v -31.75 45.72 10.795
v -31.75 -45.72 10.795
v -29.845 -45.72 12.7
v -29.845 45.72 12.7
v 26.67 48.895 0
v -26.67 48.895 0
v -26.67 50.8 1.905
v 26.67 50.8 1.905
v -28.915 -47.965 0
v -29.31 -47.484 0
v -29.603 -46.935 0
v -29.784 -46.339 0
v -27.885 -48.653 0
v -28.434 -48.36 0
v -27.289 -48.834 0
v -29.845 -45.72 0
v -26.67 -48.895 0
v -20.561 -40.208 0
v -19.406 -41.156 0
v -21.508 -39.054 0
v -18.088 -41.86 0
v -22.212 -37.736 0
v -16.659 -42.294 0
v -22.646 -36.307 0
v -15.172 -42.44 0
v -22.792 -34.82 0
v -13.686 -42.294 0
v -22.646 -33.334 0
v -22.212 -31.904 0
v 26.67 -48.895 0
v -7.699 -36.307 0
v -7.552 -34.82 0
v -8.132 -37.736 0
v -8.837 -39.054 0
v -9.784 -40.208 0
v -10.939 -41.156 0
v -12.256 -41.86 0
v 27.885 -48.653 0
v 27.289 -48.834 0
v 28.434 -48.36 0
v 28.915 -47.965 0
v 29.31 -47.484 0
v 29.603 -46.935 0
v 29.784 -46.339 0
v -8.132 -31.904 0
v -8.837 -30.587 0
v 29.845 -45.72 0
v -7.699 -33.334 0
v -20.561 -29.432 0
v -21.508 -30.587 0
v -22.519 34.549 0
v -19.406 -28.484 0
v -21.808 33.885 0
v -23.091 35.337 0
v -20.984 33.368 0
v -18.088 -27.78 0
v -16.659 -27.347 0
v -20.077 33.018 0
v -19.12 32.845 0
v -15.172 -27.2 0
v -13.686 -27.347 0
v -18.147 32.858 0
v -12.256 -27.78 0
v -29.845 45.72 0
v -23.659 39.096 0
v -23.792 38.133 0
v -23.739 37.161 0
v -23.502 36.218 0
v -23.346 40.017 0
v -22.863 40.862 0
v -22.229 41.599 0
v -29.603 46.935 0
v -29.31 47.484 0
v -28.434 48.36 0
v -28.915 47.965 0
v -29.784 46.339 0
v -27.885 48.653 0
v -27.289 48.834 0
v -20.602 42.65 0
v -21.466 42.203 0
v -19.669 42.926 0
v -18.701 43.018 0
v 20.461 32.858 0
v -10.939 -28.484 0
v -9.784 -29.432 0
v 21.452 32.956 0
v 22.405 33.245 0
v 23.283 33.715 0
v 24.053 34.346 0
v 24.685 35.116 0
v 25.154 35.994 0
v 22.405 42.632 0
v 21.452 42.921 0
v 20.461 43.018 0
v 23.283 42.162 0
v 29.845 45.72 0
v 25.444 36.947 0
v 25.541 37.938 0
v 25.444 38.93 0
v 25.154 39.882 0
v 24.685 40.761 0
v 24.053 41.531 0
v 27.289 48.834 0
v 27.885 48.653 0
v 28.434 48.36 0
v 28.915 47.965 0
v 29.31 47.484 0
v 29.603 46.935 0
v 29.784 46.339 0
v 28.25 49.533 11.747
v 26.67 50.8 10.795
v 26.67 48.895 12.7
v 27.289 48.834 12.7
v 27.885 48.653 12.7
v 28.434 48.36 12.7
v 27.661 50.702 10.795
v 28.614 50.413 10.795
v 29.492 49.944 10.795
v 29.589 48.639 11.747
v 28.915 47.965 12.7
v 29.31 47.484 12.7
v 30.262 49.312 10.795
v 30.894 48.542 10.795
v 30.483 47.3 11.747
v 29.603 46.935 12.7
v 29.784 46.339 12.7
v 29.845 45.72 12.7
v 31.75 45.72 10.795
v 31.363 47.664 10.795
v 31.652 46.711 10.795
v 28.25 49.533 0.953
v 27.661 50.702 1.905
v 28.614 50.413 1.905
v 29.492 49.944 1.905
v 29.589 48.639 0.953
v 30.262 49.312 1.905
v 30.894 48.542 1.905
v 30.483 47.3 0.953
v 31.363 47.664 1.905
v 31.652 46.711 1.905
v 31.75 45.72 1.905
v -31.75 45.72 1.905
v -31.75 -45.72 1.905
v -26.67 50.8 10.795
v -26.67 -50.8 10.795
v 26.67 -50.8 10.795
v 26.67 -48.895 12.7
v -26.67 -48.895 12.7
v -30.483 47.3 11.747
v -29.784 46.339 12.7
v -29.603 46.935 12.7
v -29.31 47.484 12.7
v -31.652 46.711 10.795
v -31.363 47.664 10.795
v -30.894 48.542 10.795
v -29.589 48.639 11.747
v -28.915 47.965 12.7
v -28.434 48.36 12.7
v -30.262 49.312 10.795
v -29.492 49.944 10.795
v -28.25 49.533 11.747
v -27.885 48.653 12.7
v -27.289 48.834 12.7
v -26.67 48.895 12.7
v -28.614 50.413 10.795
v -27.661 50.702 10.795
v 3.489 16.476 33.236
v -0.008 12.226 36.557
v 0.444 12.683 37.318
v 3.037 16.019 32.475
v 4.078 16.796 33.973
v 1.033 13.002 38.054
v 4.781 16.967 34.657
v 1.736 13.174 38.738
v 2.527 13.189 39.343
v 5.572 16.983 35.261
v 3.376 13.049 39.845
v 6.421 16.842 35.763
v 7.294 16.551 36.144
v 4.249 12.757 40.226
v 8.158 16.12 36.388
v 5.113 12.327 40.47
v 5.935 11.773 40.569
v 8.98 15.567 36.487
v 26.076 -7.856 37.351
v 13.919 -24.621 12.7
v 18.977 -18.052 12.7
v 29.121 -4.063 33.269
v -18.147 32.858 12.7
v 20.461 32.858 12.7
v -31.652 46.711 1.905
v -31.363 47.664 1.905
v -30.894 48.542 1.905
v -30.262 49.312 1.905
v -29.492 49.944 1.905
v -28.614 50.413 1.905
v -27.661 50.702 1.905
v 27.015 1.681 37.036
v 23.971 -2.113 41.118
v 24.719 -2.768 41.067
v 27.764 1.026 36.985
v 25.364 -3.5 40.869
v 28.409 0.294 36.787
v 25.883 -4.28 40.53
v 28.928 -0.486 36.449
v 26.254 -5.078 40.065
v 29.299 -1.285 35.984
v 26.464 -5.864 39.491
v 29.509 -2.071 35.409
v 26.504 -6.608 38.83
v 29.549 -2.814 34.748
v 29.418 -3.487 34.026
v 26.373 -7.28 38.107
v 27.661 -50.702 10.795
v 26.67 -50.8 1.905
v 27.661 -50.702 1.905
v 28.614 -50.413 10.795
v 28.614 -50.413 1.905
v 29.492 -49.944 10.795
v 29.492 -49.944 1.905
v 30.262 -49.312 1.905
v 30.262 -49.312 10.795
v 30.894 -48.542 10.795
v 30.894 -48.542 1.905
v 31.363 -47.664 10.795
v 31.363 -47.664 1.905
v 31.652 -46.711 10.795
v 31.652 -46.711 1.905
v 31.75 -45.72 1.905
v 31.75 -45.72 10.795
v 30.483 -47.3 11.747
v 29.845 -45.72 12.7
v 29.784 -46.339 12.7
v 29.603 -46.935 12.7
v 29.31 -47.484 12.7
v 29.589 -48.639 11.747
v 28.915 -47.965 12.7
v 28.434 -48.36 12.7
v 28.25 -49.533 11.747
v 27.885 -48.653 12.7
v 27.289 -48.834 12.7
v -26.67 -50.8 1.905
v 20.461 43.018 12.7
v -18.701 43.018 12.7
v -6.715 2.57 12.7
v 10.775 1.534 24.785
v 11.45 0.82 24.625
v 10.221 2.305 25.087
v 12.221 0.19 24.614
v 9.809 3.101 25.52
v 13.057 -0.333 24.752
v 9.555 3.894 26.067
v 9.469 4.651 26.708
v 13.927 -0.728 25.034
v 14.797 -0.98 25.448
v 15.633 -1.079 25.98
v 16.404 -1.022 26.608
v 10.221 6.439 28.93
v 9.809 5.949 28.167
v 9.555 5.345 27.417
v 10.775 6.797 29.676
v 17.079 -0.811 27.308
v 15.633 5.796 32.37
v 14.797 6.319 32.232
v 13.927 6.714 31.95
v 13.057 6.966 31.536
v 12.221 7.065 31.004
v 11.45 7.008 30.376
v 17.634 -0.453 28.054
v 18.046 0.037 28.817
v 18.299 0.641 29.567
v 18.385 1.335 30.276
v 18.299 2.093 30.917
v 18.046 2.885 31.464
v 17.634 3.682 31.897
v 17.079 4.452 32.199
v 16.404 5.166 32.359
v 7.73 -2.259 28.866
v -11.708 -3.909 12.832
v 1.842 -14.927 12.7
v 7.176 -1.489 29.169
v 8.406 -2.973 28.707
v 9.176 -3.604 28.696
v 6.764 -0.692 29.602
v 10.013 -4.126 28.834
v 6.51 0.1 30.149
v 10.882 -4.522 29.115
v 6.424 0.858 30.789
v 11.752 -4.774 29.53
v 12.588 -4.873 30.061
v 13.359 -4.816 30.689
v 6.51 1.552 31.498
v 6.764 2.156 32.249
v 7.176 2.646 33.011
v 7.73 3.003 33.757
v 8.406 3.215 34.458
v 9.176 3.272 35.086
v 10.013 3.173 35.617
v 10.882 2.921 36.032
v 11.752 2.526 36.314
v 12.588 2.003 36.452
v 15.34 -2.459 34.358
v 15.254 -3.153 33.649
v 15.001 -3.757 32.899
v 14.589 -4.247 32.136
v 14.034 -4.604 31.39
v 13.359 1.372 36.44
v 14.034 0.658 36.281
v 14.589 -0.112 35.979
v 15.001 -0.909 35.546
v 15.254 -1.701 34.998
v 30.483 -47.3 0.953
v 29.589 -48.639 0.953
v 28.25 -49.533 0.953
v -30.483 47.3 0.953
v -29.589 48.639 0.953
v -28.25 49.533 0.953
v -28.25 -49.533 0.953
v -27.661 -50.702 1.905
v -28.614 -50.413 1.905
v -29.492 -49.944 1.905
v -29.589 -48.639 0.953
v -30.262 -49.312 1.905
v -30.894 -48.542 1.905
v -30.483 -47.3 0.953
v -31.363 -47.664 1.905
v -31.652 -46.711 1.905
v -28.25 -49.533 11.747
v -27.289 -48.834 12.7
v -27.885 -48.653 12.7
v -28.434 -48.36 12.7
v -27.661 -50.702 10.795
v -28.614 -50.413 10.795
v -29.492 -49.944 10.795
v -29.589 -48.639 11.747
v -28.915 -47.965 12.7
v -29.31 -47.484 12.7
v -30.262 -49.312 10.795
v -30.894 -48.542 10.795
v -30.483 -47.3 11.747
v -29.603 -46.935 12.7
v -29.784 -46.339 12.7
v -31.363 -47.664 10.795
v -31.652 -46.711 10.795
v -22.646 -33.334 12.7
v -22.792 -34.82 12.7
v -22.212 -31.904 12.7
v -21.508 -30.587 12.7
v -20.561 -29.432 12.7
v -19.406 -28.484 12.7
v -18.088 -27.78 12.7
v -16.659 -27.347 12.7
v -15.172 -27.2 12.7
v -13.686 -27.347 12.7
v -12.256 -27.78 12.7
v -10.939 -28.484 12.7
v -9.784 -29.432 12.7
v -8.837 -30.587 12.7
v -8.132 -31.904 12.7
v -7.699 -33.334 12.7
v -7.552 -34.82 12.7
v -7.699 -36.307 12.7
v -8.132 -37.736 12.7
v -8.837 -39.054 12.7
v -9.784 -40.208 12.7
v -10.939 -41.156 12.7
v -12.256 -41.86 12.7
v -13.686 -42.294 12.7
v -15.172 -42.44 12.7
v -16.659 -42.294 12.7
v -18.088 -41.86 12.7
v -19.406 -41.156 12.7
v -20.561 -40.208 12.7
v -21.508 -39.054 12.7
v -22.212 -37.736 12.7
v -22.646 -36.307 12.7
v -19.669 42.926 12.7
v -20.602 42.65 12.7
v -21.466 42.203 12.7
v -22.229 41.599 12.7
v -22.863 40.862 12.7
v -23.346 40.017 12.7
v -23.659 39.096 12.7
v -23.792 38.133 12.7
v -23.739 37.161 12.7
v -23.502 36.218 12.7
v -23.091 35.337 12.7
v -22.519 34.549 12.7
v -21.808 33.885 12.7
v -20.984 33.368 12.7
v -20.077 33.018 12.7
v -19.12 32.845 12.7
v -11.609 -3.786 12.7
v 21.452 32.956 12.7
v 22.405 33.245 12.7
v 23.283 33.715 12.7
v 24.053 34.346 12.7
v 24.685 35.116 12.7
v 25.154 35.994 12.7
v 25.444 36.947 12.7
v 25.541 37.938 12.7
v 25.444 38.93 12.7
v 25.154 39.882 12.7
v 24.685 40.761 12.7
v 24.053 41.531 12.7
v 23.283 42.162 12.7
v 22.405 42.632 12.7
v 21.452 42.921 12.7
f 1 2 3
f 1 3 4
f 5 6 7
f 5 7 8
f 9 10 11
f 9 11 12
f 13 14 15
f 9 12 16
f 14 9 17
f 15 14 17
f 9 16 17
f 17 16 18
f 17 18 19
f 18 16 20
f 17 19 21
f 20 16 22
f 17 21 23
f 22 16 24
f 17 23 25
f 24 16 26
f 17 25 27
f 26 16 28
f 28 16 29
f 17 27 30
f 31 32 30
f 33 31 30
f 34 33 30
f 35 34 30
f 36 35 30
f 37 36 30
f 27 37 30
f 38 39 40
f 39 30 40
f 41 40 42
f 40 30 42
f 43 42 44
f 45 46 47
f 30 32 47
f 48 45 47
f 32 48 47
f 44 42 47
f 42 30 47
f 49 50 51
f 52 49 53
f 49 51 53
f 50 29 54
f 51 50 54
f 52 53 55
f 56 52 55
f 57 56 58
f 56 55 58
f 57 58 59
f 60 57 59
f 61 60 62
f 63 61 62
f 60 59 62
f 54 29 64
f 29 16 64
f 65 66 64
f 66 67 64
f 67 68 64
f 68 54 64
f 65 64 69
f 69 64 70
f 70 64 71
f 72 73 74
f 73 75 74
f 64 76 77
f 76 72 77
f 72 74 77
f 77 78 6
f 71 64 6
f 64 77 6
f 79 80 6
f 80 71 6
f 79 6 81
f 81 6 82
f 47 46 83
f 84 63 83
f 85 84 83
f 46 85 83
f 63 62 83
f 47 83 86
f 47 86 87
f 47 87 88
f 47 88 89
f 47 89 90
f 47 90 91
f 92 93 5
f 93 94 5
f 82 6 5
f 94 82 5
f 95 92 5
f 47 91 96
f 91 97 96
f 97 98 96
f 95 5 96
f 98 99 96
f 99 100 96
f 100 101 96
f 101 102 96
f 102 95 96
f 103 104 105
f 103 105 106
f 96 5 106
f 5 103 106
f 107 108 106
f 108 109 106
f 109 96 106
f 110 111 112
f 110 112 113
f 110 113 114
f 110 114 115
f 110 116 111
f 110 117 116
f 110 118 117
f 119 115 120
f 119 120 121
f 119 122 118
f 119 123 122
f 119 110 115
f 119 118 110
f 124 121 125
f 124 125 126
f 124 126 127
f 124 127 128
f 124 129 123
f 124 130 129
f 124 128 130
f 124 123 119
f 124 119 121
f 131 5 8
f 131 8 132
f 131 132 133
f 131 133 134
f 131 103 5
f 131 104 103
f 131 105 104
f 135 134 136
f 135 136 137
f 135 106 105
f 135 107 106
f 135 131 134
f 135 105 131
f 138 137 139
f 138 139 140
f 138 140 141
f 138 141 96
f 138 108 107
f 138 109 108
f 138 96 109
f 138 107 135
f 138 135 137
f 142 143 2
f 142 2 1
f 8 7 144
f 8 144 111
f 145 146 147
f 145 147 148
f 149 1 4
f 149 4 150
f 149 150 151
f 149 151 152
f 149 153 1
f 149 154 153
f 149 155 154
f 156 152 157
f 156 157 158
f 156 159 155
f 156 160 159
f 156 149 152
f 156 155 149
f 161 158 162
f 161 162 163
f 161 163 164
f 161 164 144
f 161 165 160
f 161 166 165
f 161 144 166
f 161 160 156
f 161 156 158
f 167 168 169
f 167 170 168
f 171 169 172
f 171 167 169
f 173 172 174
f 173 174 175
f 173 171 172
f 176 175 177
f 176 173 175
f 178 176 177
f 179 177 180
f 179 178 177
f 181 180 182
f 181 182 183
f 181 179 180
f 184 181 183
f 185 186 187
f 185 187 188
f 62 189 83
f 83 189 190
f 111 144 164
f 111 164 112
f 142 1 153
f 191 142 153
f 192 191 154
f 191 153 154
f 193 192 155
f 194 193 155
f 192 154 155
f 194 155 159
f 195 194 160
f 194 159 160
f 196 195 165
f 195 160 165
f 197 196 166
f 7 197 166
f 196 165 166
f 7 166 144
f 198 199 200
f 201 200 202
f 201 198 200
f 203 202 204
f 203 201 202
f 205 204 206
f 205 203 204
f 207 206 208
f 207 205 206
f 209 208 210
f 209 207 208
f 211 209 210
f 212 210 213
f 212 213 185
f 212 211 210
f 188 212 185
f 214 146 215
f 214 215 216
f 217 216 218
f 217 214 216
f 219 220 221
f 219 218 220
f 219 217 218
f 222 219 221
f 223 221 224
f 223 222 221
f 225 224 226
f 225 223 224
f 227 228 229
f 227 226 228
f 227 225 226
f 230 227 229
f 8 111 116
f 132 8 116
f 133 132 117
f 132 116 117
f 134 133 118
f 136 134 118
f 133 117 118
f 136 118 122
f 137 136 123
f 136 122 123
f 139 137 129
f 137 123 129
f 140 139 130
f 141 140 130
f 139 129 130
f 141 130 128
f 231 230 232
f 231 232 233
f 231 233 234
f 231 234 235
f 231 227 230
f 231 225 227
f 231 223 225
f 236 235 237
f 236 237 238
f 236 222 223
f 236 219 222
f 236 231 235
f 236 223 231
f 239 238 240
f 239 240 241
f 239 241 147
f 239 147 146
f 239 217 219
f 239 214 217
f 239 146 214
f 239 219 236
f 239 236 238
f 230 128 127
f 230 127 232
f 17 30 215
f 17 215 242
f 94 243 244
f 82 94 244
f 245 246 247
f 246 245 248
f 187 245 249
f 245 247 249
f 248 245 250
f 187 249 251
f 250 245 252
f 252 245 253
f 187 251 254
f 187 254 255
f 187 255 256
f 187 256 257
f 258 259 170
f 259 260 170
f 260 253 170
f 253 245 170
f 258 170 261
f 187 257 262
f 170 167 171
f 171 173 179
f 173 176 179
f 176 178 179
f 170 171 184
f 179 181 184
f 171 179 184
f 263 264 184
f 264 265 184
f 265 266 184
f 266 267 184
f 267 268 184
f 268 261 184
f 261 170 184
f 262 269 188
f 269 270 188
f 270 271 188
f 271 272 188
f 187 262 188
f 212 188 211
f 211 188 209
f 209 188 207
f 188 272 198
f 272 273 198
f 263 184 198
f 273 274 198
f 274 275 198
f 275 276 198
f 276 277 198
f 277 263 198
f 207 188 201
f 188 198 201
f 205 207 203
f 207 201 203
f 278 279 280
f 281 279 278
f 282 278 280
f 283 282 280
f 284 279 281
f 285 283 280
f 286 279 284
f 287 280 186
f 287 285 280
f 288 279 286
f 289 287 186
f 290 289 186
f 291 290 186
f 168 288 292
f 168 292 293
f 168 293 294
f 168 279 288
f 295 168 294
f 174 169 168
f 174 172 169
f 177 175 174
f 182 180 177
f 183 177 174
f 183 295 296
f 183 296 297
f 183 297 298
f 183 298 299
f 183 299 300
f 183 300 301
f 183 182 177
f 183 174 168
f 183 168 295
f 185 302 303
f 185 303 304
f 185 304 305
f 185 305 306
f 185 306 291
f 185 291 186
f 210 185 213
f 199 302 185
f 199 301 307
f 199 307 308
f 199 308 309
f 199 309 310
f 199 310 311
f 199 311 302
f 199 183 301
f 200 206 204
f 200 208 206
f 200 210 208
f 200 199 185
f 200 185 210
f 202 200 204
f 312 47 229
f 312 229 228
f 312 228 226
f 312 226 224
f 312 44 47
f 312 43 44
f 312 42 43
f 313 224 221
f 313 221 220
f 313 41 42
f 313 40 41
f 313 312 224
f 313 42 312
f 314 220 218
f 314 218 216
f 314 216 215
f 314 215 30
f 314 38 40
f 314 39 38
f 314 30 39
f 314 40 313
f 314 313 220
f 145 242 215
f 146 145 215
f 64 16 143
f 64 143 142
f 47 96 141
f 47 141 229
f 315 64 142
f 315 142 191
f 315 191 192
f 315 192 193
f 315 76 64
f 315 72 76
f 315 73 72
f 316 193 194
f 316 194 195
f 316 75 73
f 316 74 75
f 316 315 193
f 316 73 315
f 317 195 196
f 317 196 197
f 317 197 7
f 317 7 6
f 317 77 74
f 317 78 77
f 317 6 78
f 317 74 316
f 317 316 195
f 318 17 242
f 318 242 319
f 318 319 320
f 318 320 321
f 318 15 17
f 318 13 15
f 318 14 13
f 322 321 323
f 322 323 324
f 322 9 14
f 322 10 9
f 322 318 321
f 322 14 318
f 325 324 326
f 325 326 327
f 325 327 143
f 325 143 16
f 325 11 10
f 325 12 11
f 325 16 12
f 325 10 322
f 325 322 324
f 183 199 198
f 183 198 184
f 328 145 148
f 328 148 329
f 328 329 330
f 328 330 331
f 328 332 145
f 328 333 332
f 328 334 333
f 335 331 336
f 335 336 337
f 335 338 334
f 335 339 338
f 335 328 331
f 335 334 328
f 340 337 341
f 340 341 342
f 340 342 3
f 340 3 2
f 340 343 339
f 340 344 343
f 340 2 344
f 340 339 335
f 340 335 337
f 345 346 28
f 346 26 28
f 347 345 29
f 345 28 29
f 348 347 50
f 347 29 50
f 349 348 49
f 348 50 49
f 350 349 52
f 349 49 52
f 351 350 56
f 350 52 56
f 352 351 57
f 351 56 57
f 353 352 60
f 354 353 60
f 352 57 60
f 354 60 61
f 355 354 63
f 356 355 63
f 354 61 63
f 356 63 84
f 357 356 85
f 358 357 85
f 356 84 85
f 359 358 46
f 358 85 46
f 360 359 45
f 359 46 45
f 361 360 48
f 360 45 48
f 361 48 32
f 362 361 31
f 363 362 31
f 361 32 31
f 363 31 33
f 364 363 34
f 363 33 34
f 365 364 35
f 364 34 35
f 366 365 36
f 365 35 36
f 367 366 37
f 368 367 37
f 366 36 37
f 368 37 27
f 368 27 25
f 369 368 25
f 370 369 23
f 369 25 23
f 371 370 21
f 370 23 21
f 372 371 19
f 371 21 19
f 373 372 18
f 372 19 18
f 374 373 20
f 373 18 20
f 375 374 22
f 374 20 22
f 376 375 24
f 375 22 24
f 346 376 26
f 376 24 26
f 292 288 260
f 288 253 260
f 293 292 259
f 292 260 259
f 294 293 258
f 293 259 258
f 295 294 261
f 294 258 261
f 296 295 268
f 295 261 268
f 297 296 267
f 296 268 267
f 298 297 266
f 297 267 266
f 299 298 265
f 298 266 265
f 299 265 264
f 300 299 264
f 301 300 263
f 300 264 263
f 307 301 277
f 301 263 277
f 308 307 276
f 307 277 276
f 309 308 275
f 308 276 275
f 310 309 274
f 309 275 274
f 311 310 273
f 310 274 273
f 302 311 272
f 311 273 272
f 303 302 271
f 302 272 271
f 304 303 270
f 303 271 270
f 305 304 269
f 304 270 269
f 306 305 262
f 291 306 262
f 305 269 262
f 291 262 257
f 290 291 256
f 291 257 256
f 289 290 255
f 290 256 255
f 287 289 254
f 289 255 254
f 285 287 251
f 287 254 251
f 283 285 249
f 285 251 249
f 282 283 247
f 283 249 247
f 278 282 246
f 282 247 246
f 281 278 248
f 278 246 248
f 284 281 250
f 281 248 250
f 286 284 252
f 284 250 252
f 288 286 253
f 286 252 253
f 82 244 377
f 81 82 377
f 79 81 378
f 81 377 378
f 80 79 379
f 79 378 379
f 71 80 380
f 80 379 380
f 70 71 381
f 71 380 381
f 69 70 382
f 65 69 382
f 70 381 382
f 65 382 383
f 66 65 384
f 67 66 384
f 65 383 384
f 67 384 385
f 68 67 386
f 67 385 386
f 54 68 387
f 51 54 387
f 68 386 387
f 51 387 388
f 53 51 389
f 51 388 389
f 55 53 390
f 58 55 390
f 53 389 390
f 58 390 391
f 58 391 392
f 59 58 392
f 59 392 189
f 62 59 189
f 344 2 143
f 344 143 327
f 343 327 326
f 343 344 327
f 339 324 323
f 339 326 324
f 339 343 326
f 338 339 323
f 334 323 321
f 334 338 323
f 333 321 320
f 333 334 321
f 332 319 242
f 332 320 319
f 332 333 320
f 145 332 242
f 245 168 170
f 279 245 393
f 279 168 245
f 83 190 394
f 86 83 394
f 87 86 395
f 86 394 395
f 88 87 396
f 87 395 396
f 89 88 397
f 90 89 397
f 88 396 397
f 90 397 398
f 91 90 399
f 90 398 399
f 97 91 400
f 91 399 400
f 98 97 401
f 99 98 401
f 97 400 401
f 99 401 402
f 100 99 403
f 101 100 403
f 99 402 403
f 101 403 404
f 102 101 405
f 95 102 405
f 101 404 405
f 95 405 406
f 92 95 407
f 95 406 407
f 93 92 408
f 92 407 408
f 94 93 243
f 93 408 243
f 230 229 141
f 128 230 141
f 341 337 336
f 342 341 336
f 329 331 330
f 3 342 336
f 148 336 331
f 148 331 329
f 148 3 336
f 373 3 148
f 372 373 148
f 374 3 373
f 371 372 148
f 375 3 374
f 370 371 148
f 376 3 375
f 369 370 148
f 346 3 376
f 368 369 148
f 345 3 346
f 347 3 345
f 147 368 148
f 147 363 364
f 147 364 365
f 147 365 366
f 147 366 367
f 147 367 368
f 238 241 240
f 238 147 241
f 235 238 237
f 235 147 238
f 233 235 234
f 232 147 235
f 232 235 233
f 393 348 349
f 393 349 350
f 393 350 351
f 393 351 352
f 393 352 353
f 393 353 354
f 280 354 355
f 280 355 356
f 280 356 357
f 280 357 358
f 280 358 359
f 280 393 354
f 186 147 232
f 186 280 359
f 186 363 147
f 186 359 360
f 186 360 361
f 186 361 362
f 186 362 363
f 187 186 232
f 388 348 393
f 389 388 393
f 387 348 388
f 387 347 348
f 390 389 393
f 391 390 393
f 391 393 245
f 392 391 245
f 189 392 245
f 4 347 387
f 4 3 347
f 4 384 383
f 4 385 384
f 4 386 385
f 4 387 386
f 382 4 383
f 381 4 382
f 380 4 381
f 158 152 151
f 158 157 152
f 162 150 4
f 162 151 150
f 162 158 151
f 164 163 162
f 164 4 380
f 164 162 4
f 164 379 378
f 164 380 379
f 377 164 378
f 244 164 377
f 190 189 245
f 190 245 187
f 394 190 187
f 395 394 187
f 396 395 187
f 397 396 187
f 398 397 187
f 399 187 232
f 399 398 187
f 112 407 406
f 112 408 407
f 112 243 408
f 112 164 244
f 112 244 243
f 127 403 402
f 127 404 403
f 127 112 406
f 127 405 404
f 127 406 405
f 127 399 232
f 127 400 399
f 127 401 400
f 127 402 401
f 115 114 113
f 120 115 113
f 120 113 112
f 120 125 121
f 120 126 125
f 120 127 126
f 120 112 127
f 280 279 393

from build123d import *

# Parameters (mm, degrees)
F0_W      = 63.5
F0_H      = 101.6
F1_DEPTH  = 12.7
F5_DEPTH  = 6.35
F6_R      = 5.08
F8_D      = 10.16
F8_DEPTH  = 6.35
F8_TIP    = 3.0523719447
F10_D     = 15.24
F10_DEPTH = 12.7
F10_TIP   = 4.578557917
F12_DEPTH = 25.4
F13_R     = 5.08
F14_SIZE  = 1.905
F15_SIZE  = 1.905


with BuildPart() as f1:
    # F0 (on Top) → F1 (new body)
    with BuildSketch(Plane.XY):
        Rectangle(F0_W, F0_H)
    extrude(amount=F1_DEPTH)

    # F4 (on face) → F5 (join)
    with BuildSketch(Plane(origin=(-7.7671213914, -9.6767273995, 10.4118445509), x_dir=(0.8775350605, -0.3264402976, 0.3512391632), z_dir=(-0.4795124792, -0.5974042778, 0.6427876097))):
        Polygon((11.0284127295, 38.4279564023), (-4.4907014817, 5.8724405244), (24.646670238, -9.5275499275), (40.752428482, 24.2586095854), align=None)
    extrude(amount=-F5_DEPTH)

    # F6
    f6_edges = [f1.edges().sort_by_distance(p)[0] for p in [
        (3.43315, 16.768092, 38.405412),
        (29.517016, -3.313961, 39.199507),
    ]]
    fillet(f6_edges, radius=F6_R)

    # F8
    with Locations(Plane(origin=(-7.7671213914, -9.6767273995, 10.4118445509), x_dir=(0.8775350605, -0.3264402976, 0.3512391632), z_dir=(-0.4795124792, -0.5974042778, 0.6427876097))):
        with Locations((21.2519261986, 21.5889699757)):
            Hole(F8_D / 2, depth=F8_DEPTH)
            with Locations((0, 0, -(F8_DEPTH + F8_TIP / 2))):  # 118° drill point
                Cone(0, F8_D / 2, F8_TIP, mode=Mode.SUBTRACT)

    # F10
    with Locations(Plane.XY.offset(12.7)):
        with Locations((-15.1724275202, -34.8201803863)):
            Hole(F10_D / 2, depth=F10_DEPTH)
            with Locations((0, 0, -(F10_DEPTH + F10_TIP / 2))):  # 118° drill point
                Cone(0, F10_D / 2, F10_TIP, mode=Mode.SUBTRACT)

    # F11 (on face) → F12 (cut)
    with BuildSketch(Plane.XY.offset(12.7)):
        with BuildLine():
            ThreePointArc((-18.7010167369, 43.0184446276), (-23.7885681435, 37.6458278877), (-18.1468351234, 32.8584446276))
            Line((-18.1468351234, 32.8584446276), (20.4611556194, 32.8584446276))
            ThreePointArc((20.4611556194, 32.8584446276), (25.5411556194, 37.9384446276), (20.4611556194, 43.0184446276))
            Line((20.4611556194, 43.0184446276), (-18.7010167369, 43.0184446276))
        make_face()
    extrude(amount=-F12_DEPTH, mode=Mode.SUBTRACT)

    # F13
    f13_edges = [f1.edges().sort_by_distance(p)[0] for p in [
        (-31.75, 50.8, 6.35),
        (-31.75, -50.8, 6.35),
        (31.75, -50.8, 6.35),
        (31.75, 50.8, 6.35),
    ]]
    fillet(f13_edges, radius=F13_R)

    # F14
    f14_edges = [f1.edges().sort_by_distance(p)[0] for p in [
        (-31.75, 0, 12.7),
        (0, 50.8, 12.7),
        (-30.262102, 49.312102, 12.7),
        (30.262102, 49.312102, 12.7),
        (31.75, 0, 12.7),
        (30.262102, -49.312102, 12.7),
        (0, -50.8, 12.7),
        (-30.262102, -49.312102, 12.7),
    ]]
    chamfer(f14_edges, length=F14_SIZE)

    # F15
    f15_edges = [f1.edges().sort_by_distance(p)[0] for p in [
        (-31.75, 0, 0),
        (-30.262102, 49.312102, 0),
        (0, 50.8, 0),
        (30.262102, 49.312102, 0),
        (31.75, 0, 0),
        (30.262102, -49.312102, 0),
        (0, -50.8, 0),
        (-30.262102, -49.312102, 0),
    ]]
    chamfer(f15_edges, length=F15_SIZE)


solid = f1.part
